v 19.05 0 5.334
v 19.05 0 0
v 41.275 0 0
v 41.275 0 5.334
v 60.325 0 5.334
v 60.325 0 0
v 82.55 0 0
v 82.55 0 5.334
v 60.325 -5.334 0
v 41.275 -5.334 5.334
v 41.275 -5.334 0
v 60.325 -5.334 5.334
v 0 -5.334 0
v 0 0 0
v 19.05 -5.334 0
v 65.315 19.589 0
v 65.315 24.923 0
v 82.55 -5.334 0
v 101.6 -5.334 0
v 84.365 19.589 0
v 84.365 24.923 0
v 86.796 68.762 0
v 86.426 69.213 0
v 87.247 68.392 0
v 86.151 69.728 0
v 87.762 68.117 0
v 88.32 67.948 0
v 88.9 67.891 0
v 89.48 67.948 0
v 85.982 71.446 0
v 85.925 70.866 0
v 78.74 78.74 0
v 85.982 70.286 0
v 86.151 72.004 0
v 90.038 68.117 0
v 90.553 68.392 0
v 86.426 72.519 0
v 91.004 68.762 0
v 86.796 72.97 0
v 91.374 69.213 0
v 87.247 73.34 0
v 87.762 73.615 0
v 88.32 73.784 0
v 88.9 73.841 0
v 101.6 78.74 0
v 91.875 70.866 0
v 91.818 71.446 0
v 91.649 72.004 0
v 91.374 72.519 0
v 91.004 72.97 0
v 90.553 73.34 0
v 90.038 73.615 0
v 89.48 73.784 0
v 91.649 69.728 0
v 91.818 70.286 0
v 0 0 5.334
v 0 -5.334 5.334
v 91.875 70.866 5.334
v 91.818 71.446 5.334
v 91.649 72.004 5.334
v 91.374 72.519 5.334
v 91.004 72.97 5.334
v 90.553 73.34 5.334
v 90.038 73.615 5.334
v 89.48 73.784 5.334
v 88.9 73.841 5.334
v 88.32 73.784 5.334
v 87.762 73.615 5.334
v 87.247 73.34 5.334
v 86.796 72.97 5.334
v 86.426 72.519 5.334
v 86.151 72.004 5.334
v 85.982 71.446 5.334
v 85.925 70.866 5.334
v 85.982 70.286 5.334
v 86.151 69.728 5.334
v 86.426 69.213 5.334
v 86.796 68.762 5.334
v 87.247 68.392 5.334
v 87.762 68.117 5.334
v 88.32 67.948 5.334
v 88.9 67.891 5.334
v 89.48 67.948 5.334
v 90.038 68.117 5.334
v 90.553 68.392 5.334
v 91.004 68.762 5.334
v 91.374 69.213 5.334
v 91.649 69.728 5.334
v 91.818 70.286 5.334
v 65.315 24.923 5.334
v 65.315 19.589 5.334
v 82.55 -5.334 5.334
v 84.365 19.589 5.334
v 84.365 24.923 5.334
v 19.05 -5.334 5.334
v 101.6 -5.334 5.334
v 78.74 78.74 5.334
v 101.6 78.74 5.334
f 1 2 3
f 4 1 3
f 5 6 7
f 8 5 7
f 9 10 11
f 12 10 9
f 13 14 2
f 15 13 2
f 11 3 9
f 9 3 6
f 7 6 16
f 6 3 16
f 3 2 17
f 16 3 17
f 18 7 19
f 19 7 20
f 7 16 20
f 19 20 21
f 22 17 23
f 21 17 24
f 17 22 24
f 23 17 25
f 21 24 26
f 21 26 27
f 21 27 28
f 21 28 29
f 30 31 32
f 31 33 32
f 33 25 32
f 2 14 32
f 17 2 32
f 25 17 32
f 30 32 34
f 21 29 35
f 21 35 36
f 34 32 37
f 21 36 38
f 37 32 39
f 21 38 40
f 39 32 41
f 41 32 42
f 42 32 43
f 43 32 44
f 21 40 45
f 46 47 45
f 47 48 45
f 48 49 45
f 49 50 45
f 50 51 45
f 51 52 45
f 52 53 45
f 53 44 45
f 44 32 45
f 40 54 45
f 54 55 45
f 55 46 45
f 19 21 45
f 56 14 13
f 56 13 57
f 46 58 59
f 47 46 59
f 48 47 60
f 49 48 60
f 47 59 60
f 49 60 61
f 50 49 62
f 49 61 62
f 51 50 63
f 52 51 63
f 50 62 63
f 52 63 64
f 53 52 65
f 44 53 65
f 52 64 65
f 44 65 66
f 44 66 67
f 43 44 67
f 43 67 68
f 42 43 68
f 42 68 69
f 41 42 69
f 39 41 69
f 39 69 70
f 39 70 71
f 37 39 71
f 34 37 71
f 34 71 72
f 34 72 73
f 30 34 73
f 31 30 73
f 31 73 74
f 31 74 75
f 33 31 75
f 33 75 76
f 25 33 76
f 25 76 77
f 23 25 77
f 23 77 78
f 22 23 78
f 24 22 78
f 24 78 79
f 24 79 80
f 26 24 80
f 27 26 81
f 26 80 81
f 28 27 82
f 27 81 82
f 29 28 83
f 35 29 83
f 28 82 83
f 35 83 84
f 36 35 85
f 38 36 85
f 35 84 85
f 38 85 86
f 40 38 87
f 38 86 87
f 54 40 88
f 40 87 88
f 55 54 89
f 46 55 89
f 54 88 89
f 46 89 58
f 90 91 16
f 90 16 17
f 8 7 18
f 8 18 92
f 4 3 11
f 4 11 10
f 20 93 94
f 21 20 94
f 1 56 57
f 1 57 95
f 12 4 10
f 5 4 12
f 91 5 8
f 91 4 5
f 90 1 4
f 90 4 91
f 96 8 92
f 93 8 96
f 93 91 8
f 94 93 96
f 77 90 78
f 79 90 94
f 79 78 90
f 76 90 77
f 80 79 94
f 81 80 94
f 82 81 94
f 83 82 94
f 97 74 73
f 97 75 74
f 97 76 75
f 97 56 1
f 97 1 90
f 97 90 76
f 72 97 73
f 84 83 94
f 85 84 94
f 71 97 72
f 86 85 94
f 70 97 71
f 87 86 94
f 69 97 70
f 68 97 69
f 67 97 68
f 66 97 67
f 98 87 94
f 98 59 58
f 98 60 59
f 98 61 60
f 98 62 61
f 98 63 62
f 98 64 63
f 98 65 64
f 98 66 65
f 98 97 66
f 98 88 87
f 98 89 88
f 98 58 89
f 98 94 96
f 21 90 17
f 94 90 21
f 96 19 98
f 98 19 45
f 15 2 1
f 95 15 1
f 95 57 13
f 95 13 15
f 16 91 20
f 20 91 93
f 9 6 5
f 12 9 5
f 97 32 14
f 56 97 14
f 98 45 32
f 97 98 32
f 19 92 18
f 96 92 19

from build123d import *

# Parameters (mm, degrees)
BASE_DEPTH         = 5.334
SKETCH2_R          = 2.975
SKETCH2_W          = 19.05
SKETCH2_H          = 5.334
MOUNT_POINTS_DEPTH = 129.650686574
SKETCH3_W          = 19.05
SKETCH3_H          = 5.334
TABS_DEPTH         = 5.334


with BuildPart() as part:
    # Sketch1 → Base (new body)
    with BuildSketch(Plane.XY):
        Polygon((78.74, 78.74), (0, 0), (101.6, 0), (101.6, 78.74), align=None)
    extrude(amount=BASE_DEPTH)

    # Sketch2 → Mount Points (cut, through all)
    with BuildSketch(Plane.XY.offset(5.334)):
        with Locations((88.9, 70.866)):
            Circle(SKETCH2_R)
        with Locations((74.84, 22.256365646)):
            Rectangle(SKETCH2_W, SKETCH2_H)
    extrude(amount=-MOUNT_POINTS_DEPTH, mode=Mode.SUBTRACT)

    # Sketch3 → Tabs (add)
    with BuildSketch(Plane.XZ):
        with Locations((9.525, 2.667)):
            Rectangle(SKETCH3_W, SKETCH3_H)
        with Locations((92.075, 2.667)):
            Rectangle(SKETCH3_W, SKETCH3_H)
        with Locations((50.8, 2.667)):
            Rectangle(SKETCH3_W, SKETCH3_H)
    extrude(amount=TABS_DEPTH)


solid = part.part
